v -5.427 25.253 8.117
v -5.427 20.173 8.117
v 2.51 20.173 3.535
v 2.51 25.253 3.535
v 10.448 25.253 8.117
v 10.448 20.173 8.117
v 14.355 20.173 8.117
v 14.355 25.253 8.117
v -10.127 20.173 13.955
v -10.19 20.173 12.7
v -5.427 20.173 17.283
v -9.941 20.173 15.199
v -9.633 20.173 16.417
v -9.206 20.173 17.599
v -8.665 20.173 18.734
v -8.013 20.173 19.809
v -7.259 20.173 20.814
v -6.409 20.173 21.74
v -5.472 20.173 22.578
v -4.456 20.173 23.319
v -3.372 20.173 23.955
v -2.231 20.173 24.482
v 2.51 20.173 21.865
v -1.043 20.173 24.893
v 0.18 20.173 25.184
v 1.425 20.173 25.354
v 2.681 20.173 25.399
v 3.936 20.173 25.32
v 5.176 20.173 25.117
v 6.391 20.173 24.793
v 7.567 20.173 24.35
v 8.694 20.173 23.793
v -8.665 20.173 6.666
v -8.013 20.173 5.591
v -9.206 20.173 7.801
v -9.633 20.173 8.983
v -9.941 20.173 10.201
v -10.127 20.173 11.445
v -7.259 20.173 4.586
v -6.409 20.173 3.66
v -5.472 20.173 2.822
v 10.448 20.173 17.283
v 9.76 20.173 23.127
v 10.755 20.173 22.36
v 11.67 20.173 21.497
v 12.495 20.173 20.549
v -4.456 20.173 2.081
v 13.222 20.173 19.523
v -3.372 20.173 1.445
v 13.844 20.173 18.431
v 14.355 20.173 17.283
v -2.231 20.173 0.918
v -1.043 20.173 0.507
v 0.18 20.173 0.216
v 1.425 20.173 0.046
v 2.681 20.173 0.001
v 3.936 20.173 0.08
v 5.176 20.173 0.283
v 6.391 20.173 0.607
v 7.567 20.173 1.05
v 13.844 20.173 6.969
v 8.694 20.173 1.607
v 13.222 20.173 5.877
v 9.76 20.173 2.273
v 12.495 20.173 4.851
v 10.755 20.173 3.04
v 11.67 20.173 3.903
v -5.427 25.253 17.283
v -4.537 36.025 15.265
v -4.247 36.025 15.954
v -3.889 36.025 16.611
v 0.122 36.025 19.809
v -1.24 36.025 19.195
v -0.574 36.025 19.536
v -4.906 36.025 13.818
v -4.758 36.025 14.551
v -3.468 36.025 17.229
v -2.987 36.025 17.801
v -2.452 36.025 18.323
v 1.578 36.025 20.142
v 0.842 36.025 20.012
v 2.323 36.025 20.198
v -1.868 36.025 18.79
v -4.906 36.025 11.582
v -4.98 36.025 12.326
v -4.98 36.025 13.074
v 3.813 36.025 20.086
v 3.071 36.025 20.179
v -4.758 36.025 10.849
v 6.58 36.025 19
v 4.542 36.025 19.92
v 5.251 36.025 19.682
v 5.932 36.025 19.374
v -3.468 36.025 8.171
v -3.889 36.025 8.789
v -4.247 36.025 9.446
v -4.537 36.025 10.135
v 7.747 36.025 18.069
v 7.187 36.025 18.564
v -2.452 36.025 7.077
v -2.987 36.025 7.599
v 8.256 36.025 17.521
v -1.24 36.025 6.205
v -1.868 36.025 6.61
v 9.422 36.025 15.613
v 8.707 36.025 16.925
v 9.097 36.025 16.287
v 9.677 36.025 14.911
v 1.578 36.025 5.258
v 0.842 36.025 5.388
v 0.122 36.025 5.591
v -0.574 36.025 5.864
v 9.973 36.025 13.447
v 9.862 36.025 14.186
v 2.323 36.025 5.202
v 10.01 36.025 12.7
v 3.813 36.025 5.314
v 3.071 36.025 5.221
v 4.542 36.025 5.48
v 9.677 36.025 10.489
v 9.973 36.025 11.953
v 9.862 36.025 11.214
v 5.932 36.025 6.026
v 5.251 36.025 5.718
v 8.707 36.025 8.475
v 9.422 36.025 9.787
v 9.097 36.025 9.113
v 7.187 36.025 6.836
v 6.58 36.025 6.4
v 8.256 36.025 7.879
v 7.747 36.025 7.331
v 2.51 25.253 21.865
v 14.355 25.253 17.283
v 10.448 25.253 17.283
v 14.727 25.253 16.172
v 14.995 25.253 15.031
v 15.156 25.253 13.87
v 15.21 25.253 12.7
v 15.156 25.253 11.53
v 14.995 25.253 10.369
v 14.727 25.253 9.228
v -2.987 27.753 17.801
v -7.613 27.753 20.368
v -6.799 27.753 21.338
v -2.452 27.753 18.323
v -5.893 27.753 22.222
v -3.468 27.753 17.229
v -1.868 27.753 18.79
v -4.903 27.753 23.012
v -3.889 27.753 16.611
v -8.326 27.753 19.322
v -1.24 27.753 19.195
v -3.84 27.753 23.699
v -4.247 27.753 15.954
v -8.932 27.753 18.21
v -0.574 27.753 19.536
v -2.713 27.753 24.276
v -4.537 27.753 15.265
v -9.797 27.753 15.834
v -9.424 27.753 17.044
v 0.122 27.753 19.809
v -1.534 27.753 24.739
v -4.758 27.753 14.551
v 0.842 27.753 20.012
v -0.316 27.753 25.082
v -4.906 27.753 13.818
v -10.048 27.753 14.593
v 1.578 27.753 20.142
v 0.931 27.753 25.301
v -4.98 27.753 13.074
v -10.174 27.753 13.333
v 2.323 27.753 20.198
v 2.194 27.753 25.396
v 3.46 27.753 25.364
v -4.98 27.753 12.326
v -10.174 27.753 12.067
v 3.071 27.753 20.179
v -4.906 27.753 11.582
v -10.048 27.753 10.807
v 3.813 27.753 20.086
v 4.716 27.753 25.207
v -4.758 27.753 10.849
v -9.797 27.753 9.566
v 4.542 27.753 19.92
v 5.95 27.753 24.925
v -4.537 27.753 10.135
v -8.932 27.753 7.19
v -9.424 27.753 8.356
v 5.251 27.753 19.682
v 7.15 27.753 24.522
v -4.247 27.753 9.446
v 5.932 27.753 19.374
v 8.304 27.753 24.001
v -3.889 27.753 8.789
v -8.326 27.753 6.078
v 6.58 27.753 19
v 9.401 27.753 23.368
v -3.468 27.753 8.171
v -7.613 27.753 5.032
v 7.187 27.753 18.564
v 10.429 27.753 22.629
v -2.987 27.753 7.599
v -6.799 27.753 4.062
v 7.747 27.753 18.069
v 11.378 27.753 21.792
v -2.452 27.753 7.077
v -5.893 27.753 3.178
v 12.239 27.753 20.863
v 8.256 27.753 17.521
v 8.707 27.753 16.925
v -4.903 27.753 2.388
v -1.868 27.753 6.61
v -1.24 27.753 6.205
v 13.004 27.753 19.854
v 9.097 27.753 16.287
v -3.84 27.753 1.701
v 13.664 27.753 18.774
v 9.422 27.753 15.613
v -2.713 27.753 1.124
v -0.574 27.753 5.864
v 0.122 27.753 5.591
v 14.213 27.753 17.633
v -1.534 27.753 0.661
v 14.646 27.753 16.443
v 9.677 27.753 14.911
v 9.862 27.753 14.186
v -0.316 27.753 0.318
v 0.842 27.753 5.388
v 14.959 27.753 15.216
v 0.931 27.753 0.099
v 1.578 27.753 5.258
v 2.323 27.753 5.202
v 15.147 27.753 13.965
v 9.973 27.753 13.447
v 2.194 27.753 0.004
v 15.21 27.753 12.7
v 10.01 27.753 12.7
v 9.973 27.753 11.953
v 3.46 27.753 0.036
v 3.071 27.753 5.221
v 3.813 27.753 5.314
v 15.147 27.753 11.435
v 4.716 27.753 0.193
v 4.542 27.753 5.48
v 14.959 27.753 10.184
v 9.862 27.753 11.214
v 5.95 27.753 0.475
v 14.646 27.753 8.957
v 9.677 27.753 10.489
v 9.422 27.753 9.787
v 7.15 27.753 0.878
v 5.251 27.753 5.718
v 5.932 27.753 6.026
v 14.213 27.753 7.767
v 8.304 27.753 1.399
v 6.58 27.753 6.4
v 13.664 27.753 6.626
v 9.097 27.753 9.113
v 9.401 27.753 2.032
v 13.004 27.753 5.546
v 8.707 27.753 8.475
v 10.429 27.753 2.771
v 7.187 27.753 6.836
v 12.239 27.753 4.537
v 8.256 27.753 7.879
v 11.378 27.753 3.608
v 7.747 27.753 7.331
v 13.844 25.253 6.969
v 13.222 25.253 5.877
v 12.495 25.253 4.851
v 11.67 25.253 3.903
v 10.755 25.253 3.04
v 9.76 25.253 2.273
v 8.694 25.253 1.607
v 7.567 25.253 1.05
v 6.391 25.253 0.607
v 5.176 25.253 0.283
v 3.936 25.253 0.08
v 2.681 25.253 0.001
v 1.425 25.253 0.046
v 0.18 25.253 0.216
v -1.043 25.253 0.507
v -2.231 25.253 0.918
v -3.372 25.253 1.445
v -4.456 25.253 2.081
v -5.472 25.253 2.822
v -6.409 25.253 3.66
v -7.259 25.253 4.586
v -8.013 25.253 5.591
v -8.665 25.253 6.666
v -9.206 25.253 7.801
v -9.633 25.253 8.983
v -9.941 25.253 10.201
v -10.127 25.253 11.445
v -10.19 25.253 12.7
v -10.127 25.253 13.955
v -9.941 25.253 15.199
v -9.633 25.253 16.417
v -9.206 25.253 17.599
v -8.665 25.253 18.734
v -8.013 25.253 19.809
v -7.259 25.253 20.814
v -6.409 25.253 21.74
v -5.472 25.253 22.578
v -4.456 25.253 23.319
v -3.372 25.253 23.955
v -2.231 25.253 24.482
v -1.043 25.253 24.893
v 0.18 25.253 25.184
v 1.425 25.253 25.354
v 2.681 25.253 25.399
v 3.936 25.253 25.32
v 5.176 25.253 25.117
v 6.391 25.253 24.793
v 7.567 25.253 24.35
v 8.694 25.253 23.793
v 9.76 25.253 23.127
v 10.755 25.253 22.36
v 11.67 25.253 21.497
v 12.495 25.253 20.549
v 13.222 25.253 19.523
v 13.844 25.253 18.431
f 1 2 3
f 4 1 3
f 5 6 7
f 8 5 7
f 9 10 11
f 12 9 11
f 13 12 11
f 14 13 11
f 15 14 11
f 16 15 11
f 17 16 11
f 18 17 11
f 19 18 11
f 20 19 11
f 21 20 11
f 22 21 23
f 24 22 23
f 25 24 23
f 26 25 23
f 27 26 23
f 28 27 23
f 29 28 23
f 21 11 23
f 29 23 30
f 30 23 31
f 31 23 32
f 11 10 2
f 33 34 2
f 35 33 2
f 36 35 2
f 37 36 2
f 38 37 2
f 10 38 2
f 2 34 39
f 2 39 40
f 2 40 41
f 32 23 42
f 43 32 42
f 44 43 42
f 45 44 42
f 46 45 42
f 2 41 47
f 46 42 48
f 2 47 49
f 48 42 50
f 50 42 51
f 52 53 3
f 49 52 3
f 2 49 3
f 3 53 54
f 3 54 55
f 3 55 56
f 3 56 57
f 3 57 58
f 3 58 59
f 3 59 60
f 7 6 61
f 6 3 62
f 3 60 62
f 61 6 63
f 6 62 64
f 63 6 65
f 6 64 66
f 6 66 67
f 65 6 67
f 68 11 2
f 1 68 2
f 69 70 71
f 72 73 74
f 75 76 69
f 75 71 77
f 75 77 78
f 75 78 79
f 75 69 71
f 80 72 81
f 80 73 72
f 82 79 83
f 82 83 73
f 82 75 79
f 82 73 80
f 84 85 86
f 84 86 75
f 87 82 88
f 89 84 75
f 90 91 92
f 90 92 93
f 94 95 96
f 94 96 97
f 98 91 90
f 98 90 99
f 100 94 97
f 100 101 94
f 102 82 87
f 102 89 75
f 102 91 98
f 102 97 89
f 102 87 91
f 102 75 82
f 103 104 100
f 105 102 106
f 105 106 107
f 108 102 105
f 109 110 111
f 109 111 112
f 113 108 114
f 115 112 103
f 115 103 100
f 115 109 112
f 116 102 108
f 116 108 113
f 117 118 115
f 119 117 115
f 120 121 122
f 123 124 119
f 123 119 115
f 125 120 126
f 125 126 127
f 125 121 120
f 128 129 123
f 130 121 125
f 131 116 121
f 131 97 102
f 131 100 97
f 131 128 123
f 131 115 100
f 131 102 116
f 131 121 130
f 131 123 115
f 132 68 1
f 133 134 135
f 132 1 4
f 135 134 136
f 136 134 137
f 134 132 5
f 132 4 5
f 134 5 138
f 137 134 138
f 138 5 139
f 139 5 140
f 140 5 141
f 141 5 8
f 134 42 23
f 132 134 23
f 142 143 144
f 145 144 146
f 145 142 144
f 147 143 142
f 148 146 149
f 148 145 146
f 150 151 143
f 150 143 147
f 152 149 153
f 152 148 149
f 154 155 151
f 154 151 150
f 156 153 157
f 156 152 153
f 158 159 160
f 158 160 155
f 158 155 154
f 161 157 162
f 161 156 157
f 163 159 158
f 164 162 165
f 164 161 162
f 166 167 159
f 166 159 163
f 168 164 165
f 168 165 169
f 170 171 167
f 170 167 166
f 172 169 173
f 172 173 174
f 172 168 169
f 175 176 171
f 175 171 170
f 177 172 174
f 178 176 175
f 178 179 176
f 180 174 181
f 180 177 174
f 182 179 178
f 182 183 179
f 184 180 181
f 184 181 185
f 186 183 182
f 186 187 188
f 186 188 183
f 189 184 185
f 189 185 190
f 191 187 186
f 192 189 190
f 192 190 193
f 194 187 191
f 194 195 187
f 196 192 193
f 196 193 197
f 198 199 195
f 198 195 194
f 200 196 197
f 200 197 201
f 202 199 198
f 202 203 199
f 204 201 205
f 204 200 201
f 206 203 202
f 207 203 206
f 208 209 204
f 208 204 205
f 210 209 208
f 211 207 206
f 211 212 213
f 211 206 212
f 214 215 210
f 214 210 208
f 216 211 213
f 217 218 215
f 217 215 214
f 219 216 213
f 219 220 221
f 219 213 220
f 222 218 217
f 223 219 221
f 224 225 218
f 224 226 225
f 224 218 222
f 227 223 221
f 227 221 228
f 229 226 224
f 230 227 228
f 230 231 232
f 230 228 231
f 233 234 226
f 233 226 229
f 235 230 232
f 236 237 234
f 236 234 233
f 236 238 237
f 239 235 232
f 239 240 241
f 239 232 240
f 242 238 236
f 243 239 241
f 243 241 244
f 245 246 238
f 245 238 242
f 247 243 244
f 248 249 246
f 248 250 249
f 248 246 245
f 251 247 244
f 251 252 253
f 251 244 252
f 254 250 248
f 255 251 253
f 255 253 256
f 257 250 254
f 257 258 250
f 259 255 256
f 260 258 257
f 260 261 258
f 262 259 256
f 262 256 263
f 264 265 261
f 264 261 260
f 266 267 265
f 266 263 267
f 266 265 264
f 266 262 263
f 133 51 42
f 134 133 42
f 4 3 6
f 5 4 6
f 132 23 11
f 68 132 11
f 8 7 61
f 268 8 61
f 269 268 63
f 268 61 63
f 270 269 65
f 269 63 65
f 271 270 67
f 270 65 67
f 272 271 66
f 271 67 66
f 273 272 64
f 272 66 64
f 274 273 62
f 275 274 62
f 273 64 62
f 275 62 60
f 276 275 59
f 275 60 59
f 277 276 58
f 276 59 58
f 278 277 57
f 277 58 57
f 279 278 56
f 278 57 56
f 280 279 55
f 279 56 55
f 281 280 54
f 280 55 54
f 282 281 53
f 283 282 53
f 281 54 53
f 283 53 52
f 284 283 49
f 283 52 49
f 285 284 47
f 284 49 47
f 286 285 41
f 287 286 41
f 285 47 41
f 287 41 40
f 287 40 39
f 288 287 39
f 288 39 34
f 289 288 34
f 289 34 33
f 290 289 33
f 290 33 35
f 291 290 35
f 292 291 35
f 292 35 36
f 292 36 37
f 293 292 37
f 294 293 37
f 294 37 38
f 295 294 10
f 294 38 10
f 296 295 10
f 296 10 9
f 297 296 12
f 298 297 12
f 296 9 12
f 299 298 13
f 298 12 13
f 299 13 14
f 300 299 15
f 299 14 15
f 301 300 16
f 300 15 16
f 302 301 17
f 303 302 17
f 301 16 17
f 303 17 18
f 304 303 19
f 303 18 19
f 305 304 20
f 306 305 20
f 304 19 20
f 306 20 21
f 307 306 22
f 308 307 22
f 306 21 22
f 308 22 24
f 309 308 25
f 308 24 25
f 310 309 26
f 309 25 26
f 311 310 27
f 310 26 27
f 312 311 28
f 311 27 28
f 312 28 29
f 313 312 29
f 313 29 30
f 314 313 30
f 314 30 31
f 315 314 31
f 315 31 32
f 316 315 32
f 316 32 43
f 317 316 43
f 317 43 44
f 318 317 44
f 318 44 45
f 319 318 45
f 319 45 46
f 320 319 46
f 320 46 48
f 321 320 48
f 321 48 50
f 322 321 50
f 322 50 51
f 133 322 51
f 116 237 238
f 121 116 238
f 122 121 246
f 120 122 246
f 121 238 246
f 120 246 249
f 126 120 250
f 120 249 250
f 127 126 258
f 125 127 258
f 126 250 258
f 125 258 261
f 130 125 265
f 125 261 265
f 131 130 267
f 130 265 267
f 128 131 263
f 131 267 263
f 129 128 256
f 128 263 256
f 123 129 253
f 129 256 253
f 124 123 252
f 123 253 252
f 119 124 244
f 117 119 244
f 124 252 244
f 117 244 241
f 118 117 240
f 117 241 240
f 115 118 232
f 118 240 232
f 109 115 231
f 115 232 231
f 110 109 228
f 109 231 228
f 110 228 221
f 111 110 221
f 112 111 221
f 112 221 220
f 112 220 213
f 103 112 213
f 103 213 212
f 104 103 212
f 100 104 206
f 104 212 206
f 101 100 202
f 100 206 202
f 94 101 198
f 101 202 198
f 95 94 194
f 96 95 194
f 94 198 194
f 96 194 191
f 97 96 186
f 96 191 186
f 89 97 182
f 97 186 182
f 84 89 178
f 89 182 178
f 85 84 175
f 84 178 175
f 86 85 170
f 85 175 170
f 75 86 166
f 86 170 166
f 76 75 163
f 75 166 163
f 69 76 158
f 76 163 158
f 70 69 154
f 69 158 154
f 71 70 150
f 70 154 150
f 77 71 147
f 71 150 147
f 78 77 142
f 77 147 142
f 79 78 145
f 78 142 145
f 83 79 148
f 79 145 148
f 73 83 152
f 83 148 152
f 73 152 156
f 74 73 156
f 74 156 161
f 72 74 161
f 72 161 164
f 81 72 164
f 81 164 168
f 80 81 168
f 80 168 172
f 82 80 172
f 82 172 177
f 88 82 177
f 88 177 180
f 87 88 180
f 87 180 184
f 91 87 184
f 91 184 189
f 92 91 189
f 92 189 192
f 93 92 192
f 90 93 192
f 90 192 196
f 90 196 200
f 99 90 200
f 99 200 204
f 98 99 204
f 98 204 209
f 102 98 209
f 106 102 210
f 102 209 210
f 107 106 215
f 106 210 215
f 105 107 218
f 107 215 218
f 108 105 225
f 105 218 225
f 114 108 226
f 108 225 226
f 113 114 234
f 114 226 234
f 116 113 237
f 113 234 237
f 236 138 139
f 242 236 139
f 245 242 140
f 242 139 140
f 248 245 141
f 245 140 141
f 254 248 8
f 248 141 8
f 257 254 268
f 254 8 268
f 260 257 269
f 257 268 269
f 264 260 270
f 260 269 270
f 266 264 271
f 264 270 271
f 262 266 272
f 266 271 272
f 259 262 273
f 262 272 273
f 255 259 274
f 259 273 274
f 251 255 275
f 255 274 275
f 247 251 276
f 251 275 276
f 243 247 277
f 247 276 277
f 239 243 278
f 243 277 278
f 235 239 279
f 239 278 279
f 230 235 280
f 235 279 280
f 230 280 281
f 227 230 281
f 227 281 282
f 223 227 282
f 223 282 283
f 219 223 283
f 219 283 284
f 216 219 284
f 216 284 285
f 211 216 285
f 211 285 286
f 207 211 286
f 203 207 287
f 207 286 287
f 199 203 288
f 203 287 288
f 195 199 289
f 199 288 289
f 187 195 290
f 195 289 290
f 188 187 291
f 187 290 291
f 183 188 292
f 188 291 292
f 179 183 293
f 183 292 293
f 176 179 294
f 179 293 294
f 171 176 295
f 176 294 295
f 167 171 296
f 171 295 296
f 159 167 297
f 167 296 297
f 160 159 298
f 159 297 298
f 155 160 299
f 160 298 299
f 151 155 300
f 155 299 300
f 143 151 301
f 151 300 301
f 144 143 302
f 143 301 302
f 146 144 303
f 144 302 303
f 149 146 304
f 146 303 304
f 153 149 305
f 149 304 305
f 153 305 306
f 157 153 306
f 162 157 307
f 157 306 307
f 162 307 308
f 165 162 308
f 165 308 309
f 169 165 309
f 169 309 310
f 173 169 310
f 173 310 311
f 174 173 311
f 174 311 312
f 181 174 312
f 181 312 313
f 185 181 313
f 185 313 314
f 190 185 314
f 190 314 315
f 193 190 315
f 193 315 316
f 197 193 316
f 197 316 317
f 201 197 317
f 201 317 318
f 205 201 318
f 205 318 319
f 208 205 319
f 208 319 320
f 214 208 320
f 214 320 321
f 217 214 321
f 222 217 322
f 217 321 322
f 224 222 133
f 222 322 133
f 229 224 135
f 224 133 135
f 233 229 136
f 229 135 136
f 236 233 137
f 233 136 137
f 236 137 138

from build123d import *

# Parameters (mm, degrees)
BOSS_EXTRUDE1_DEPTH = 25.4
BOSS_EXTRUDE3_DEPTH = 5.08
SKETCH4_W           = 37.4
SKETCH4_H           = 25.4
CUT_EXTRUDE1_DEPTH  = 25.4
SKETCH5_R           = 12.7
BOSS_EXTRUDE4_DEPTH = 2.5
SKETCH6_R           = 7.5
BOSS_EXTRUDE5_DEPTH = 8.272


with BuildPart() as part:
    # Sketch1 → Boss-Extrude1 (new body)
    with BuildSketch(Plane.XY):
        Polygon((-10.189534884, 0), (-10.189534884, 9), (15.210465116, 9), (15.210465116, 0), (21.210465116, 0), (21.210465116, 20.17346), (-16.189534884, 20.17346), (-16.189534884, 0), align=None)
    extrude(amount=BOSS_EXTRUDE1_DEPTH)

    # Sketch3 → Boss-Extrude3 (add)
    with BuildSketch(Plane(origin=(0, 20.17346, 0), x_dir=(1, 0, 0), z_dir=(0, 1, 0))):
        with BuildLine():
            Line((14.354818113, -17.282717762), (10.447965116, -17.282717762))
            Line((10.447965116, -17.282717762), (2.510465116, -21.865435523))
            Line((2.510465116, -21.865435523), (-5.427034884, -17.282717762))
            Line((-5.427034884, -17.282717762), (-5.427034884, -8.117282238))
            Line((-5.427034884, -8.117282238), (2.510465116, -3.534564477))
            Line((2.510465116, -3.534564477), (10.447965116, -8.117282238))
            Line((10.447965116, -8.117282238), (14.354818113, -8.117282238))
            ThreePointArc((14.354818113, -8.117282238), (-10.189534884, -12.7), (14.354818113, -17.282717762))
        make_face()
    extrude(amount=BOSS_EXTRUDE3_DEPTH)

    # Sketch4 → Cut-Extrude1 (cut)
    with BuildSketch(Plane(origin=(0, 20.17346, 0), x_dir=(1, 0, 0), z_dir=(0, 1, 0))):
        with Locations((2.510465116, -12.7)):
            Rectangle(SKETCH4_W, SKETCH4_H)
    extrude(amount=-CUT_EXTRUDE1_DEPTH, mode=Mode.SUBTRACT)

    # Sketch5 → Boss-Extrude4 (add)
    with BuildSketch(Plane(origin=(0, 25.25346, 0), x_dir=(1, 0, 0), z_dir=(0, 1, 0))):
        with Locations((2.510465116, -12.7)):
            Circle(SKETCH5_R)
    extrude(amount=BOSS_EXTRUDE4_DEPTH)

    # Sketch6 → Boss-Extrude5 (add)
    with BuildSketch(Plane(origin=(0, 27.75346, 0), x_dir=(1, 0, 0), z_dir=(0, 1, 0))):
        with Locations((2.510465116, -12.7)):
            Circle(SKETCH6_R)
    extrude(amount=BOSS_EXTRUDE5_DEPTH)


solid = part.part
